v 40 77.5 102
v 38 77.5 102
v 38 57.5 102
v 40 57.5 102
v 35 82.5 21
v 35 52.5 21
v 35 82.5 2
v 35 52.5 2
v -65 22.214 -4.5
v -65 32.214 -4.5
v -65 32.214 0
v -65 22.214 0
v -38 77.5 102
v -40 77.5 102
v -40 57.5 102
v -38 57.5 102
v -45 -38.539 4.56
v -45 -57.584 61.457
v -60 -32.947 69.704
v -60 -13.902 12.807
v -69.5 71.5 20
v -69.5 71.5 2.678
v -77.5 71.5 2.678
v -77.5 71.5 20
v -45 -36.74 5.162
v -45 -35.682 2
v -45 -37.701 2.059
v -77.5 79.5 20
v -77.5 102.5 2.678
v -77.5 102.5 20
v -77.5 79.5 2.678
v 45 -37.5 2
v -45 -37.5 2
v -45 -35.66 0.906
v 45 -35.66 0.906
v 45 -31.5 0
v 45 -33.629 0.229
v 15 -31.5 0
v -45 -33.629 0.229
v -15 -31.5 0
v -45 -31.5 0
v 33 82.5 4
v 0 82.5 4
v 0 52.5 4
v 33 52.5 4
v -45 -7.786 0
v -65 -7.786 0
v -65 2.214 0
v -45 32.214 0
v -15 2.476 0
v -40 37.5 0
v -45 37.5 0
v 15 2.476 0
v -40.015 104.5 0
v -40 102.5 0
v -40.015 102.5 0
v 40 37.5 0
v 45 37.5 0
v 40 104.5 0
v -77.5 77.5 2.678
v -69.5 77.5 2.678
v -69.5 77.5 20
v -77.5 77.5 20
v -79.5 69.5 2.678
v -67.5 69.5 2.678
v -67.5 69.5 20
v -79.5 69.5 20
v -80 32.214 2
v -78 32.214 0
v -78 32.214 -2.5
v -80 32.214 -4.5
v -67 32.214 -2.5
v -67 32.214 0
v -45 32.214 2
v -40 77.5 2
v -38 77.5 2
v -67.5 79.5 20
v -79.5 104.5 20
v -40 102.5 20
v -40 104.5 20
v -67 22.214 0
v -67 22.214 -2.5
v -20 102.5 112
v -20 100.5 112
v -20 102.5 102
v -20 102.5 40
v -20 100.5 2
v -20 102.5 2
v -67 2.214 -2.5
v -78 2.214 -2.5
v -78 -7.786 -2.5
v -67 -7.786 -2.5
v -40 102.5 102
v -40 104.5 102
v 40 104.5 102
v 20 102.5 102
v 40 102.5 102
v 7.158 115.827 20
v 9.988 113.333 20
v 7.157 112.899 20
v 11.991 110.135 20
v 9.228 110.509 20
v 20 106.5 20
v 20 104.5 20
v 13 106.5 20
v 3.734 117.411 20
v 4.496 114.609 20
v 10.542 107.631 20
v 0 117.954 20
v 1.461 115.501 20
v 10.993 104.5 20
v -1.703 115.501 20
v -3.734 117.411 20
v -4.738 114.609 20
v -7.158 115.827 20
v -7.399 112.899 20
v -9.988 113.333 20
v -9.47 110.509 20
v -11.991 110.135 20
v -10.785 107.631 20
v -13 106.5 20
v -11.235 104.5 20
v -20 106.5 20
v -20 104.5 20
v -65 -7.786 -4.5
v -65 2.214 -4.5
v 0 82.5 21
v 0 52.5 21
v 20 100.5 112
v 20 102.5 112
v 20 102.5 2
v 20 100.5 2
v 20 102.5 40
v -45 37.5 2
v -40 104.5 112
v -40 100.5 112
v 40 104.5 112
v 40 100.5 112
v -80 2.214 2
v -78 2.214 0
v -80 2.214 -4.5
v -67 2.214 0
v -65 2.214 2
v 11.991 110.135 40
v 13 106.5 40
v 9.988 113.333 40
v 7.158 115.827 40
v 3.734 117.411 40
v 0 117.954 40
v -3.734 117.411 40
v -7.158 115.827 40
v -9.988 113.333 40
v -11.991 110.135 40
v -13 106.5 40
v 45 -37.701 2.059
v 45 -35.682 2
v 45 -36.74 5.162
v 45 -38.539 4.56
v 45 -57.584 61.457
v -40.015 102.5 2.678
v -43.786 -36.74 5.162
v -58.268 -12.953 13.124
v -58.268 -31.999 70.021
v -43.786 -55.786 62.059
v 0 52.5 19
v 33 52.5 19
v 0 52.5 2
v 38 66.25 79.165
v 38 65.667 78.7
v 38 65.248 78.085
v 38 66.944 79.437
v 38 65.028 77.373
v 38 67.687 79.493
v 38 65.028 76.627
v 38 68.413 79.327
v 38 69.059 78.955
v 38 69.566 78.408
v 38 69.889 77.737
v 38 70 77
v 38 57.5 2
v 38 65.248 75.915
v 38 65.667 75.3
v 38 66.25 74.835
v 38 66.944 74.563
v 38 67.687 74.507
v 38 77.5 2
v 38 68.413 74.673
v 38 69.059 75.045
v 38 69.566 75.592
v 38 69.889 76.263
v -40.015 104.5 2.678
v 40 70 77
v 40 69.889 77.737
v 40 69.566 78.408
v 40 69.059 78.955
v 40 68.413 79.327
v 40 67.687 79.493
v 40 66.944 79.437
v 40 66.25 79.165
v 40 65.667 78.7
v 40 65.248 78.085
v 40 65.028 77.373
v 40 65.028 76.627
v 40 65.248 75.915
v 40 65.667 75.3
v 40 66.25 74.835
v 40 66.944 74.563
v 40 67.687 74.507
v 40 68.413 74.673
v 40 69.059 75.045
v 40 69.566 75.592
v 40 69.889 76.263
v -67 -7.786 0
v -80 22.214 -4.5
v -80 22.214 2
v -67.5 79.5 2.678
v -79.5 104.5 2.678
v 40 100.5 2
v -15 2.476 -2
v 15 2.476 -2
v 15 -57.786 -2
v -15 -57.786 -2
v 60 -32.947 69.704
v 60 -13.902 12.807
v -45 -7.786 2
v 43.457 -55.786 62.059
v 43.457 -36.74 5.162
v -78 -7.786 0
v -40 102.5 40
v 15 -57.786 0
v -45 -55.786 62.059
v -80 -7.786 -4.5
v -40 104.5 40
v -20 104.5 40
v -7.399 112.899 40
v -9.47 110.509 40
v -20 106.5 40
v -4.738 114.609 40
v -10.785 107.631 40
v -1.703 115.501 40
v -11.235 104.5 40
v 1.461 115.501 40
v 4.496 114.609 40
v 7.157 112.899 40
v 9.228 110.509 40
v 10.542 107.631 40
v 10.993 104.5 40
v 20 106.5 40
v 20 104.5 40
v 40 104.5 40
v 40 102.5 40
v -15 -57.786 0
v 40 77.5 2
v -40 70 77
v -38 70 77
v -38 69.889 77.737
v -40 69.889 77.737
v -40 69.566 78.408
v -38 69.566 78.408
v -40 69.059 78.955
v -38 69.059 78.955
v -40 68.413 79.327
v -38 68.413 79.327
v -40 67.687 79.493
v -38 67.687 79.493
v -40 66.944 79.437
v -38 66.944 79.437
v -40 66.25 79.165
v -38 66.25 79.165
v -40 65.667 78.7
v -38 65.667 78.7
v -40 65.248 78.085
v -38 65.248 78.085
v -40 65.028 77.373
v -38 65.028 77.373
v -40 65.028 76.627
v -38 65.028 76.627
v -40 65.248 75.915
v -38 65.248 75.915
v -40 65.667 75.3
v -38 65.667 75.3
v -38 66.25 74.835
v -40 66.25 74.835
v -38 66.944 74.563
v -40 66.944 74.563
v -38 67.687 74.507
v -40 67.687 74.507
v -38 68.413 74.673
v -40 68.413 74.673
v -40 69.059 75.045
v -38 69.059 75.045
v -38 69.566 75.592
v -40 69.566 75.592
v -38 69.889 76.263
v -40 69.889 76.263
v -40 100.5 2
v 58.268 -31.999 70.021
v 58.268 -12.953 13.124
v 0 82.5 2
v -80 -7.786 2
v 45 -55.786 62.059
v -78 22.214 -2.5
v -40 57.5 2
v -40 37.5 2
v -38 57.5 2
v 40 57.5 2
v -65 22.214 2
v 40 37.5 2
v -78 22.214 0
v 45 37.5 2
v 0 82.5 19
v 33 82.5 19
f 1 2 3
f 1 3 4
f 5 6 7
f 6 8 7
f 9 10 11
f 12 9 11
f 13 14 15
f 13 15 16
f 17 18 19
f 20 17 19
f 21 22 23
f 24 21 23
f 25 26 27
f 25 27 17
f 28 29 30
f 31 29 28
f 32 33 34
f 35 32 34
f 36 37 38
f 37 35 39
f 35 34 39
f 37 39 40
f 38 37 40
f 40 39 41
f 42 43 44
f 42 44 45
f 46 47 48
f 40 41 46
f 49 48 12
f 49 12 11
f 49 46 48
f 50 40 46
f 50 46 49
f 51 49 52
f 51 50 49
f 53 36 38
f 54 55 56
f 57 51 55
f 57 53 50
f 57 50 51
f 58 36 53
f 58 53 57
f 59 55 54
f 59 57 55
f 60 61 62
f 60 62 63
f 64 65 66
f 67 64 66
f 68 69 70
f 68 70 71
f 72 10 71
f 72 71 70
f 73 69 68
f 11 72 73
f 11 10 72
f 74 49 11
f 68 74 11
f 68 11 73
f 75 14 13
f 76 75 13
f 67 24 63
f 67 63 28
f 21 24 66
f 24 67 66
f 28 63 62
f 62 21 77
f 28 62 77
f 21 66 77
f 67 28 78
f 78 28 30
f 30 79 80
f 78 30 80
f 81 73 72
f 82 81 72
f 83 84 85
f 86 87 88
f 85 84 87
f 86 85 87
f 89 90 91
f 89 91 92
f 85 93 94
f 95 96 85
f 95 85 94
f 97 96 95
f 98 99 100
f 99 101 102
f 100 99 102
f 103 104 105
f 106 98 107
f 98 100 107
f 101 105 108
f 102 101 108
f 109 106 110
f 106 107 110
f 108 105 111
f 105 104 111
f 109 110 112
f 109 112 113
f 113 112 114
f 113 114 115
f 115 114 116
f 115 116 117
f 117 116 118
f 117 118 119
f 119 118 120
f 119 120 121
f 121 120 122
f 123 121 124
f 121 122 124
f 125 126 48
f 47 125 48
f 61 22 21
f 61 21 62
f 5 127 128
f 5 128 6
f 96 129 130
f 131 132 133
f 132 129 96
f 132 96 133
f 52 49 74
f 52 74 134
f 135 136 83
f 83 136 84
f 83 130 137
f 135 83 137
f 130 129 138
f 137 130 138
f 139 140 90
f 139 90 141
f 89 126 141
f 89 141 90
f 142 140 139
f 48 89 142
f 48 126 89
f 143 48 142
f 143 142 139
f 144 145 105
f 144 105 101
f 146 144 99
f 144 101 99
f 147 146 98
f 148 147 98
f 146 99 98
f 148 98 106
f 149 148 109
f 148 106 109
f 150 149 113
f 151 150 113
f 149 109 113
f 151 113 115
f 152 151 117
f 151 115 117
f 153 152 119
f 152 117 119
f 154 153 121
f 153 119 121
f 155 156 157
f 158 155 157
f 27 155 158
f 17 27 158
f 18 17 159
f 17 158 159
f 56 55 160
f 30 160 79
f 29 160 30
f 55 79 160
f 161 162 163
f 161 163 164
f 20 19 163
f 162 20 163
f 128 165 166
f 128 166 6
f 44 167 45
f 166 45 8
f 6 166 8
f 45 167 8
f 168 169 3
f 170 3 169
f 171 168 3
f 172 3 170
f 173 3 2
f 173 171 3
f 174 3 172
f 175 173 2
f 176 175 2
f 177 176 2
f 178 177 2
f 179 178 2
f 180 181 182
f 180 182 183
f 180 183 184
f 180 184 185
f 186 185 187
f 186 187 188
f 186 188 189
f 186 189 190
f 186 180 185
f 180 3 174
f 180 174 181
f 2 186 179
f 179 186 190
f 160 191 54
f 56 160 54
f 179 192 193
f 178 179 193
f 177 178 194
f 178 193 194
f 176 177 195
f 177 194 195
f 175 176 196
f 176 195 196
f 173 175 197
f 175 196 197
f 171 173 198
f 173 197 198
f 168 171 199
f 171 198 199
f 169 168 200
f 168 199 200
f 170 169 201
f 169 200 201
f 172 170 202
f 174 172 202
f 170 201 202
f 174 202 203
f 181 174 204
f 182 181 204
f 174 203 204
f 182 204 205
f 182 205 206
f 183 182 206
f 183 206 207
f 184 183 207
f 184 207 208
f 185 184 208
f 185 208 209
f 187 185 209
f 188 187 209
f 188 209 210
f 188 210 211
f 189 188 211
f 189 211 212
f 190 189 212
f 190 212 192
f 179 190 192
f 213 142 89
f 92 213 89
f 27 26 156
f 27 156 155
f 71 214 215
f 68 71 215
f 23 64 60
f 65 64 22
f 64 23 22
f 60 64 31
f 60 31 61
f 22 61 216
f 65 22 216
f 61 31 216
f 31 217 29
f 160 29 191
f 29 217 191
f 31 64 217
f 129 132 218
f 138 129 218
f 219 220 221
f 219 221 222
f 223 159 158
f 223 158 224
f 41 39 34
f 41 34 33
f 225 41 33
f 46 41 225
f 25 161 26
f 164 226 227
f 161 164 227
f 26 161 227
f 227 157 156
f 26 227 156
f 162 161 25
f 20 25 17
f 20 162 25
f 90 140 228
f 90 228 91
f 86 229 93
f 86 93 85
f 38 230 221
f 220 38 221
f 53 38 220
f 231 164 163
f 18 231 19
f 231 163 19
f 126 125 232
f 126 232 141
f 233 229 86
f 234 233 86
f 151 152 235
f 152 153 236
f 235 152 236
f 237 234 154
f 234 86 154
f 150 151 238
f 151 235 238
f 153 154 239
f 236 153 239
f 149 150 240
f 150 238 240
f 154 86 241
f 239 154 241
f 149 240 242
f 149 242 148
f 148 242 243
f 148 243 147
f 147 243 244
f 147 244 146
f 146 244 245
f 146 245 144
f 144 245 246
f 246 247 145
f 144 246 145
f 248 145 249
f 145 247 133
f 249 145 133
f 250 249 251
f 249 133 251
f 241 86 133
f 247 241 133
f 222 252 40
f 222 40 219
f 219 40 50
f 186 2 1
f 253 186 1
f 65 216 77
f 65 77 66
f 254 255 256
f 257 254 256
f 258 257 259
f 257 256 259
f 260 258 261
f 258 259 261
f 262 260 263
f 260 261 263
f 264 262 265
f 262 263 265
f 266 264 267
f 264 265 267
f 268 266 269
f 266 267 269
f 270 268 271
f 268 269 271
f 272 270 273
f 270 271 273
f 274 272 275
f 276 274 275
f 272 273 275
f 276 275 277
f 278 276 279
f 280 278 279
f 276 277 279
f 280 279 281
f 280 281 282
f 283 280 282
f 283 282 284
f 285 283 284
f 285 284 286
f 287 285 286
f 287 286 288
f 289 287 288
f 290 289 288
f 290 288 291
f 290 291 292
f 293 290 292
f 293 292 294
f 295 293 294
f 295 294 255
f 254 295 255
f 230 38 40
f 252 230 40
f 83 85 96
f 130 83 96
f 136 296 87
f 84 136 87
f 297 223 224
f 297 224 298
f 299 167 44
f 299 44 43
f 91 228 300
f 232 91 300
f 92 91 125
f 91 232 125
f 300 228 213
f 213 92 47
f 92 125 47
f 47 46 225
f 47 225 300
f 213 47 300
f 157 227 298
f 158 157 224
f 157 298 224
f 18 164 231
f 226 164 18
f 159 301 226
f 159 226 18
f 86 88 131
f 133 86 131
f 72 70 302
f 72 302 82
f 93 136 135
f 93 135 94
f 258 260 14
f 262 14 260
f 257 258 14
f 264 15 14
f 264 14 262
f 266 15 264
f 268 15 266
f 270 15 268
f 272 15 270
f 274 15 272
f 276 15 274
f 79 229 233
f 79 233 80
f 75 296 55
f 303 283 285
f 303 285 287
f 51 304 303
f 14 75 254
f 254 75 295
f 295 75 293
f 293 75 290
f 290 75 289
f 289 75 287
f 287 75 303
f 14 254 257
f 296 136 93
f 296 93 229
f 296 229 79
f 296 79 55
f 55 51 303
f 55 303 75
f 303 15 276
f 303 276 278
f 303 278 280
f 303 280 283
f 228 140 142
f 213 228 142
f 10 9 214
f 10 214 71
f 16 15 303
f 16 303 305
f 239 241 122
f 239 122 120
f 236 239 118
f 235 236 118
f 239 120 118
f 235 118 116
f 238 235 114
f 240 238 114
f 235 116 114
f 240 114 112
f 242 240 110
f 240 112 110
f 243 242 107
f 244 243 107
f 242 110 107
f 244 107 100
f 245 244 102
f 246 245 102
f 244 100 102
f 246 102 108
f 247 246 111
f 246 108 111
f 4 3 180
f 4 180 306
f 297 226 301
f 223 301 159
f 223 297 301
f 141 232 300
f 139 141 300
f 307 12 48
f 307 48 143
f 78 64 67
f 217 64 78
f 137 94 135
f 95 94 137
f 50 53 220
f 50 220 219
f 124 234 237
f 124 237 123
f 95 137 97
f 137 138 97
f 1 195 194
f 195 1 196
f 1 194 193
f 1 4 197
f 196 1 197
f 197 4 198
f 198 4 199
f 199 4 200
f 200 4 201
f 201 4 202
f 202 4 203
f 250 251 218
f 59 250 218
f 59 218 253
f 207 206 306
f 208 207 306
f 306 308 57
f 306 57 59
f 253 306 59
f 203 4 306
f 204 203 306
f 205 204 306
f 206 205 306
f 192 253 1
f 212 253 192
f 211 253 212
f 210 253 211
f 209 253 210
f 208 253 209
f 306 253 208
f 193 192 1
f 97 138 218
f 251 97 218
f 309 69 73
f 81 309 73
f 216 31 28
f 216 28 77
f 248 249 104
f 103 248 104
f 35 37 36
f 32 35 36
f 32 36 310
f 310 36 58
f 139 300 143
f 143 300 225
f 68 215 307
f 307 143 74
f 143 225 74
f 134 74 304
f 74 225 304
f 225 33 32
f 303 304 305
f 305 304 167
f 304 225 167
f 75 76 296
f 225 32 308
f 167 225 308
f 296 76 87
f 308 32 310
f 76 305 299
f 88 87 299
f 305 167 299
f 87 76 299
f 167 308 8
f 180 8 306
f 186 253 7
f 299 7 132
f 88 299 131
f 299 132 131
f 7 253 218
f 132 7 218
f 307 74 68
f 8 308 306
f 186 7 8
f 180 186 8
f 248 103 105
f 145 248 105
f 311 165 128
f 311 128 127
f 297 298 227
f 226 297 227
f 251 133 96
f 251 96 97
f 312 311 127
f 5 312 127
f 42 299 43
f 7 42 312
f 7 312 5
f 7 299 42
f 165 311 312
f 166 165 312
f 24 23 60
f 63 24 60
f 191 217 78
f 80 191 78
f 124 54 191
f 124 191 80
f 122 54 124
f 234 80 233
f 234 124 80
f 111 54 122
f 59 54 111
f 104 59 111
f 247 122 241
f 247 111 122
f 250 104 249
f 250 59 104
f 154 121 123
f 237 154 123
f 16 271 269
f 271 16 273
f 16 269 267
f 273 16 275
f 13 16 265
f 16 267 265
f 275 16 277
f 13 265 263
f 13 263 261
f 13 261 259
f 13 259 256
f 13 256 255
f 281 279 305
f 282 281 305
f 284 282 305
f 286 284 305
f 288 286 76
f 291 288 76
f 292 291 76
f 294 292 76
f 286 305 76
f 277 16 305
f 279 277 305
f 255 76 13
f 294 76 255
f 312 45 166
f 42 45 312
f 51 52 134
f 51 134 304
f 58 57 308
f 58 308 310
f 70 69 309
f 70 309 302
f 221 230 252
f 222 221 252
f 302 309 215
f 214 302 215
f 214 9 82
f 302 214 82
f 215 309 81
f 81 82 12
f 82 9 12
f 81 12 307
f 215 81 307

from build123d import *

# Parameters (mm, degrees)
SKETCH3_W            = 80
SKETCH3_H            = 65
SKETCH3_W_2          = 90
SKETCH3_H_2          = 75
BOSS_EXTRUDE1_DEPTH  = 2
SKETCH6_W            = 2
SKETCH6_H            = 20
BOSS_EXTRUDE2_DEPTH  = 100
SKETCH7_R            = 2.5
CUT_EXTRUDE2_DEPTH   = 168.735655124
SKETCH9_W            = 20
SKETCH9_H            = 2
BOSS_EXTRUDE3_DEPTH  = 110
BOSS_EXTRUDE4_DEPTH  = 90
FILLET1_R            = 10
SKETCH12_W           = 30
SKETCH12_H           = 60.261991402
BOSS_EXTRUDE5_DEPTH  = 2
CUT_EXTRUDE3_DEPTH   = 113
BOSS_EXTRUDE10_DEPTH = 60
SKETCH18_W           = 35
SKETCH18_H           = 30
BOSS_EXTRUDE11_DEPTH = 2
SKETCH19_W           = 2
SKETCH19_H           = 30
BOSS_EXTRUDE12_DEPTH = 15
SKETCH20_W           = 35
SKETCH20_H           = 30
BOSS_EXTRUDE13_DEPTH = 2
SKETCH21_W           = 80
SKETCH21_H           = 10
SKETCH21_H_2         = 40
BOSS_EXTRUDE14_DEPTH = 2
SKETCH22_W           = 20
SKETCH22_H           = 20
BOSS_EXTRUDE15_DEPTH = 20
CUT_EXTRUDE4_DEPTH   = 20
SKETCH24_W           = 2
SKETCH24_H           = 40
BOSS_EXTRUDE16_DEPTH = 20
SKETCH25_W           = 6.5
SKETCH25_H           = 10
BOSS_EXTRUDE17_DEPTH = 15
SKETCH27_W           = 11
SKETCH27_H           = 2.5
CUT_EXTRUDE5_DEPTH   = 165.450600485
SKETCH29_W           = 20
SKETCH29_H           = 35
BOSS_EXTRUDE18_DEPTH = 45
SKETCH32_W           = 5.5
SKETCH32_H           = 35
SKETCH32_W_2         = 8
SKETCH32_H_2         = 6
CUT_EXTRUDE10_DEPTH  = 45
SKETCH33_W           = 39.484783522
SKETCH33_H           = 2.678161959
CUT_EXTRUDE12_DEPTH  = 37


with BuildPart() as part:
    # Sketch3 → Boss-Extrude1 (new body)
    with BuildSketch(Plane.XY):
        with Locations((0, 70)):
            Rectangle(SKETCH3_W, SKETCH3_H)
        Rectangle(SKETCH3_W_2, SKETCH3_H_2)
    extrude(amount=BOSS_EXTRUDE1_DEPTH)

    # Sketch6 → Boss-Extrude2 (add)
    with BuildSketch(Plane.XY.offset(2)):
        with Locations((-39, 67.5)):
            Rectangle(SKETCH6_W, SKETCH6_H)
        with Locations((39, 67.5)):
            Rectangle(SKETCH6_W, SKETCH6_H)
    extrude(amount=BOSS_EXTRUDE2_DEPTH)

    # Sketch7 → Cut-Extrude2 (cut, through all)
    with BuildSketch(Plane(origin=(40, 0, 0), x_dir=(0, 0, -1), z_dir=(1, 0, 0))):
        with Locations(Location((-77, 67.5, 0), (0, 0, 90))):
            Circle(SKETCH7_R)
    extrude(amount=-CUT_EXTRUDE2_DEPTH, mode=Mode.SUBTRACT)

    # Sketch9 → Boss-Extrude3 (add)
    with BuildSketch(Plane.XY.offset(2)):
        with Locations((-30, 101.5)):
            Rectangle(SKETCH9_W, SKETCH9_H)
        with Locations((30, 101.5)):
            Rectangle(SKETCH9_W, SKETCH9_H)
    extrude(amount=BOSS_EXTRUDE3_DEPTH)

    # Fillet1
    # the kernel refuses this fillet: 10 mm, written as the material it takes off along each edge
    with BuildSketch(Plane(origin=(-60, -37.5, 0), x_dir=(0, 0, 1), z_dir=(1, 0, 0))) as fillet1_piece_1:
        with BuildLine():
            CenterArc((10, -6), FILLET1_R, 143.130102354, 36.869897646)
            Line((0, -6), (-0.2, -6))
            Line((-0.2, -6), (-0.2, 0))
            Line((-0.2, 0), (0, 0.2))
            ThreePointArc((0, 0.2), (1, 0.2), (1.84, 0.12))
            Line((1.84, 0.12), (2, 0))
        make_face()
    extrude(amount=120, mode=Mode.SUBTRACT)

    # Sketch12 → Boss-Extrude5 (add)
    with BuildSketch(Plane(origin=(0, 0, 0), x_dir=(-1, 0, 0), z_dir=(0, 0, -1))):
        with Locations((0, -27.654978505)):
            Rectangle(SKETCH12_W, SKETCH12_H)
    extrude(amount=BOSS_EXTRUDE5_DEPTH)

    # Sketch18 → Boss-Extrude11 (add)
    with BuildSketch(Plane.XY.offset(2)):
        with Locations((17.5, 67.5)):
            Rectangle(SKETCH18_W, SKETCH18_H)
    extrude(amount=BOSS_EXTRUDE11_DEPTH)

    # Sketch19 → Boss-Extrude12 (add)
    with BuildSketch(Plane.XY.offset(4)):
        with Locations((34, 67.5)):
            Rectangle(SKETCH19_W, SKETCH19_H)
    extrude(amount=BOSS_EXTRUDE12_DEPTH)

    # Sketch20 → Boss-Extrude13 (add)
    with BuildSketch(Plane.XY.offset(19)):
        with Locations((17.5, 67.5)):
            Rectangle(SKETCH20_W, SKETCH20_H)
    extrude(amount=BOSS_EXTRUDE13_DEPTH)

    # Sketch21 → Boss-Extrude14 (add)
    with BuildSketch(Plane(origin=(0, 102.5, 0), x_dir=(1, 0, 0), z_dir=(0, 1, 0))):
        with Locations((0, -107)):
            Rectangle(SKETCH21_W, SKETCH21_H)
        with Locations((0, -20)):
            Rectangle(SKETCH21_W, SKETCH21_H_2)
    extrude(amount=BOSS_EXTRUDE14_DEPTH)

    # Sketch22 → Boss-Extrude15 (add)
    with BuildSketch(Plane(origin=(0, 104.5, 0), x_dir=(1, 0, 0), z_dir=(0, 1, 0))):
        with Locations((-10, -30)):
            Rectangle(SKETCH22_W, SKETCH22_H)
        with Locations((10, -30)):
            Rectangle(SKETCH22_W, SKETCH22_H)
    extrude(amount=BOSS_EXTRUDE15_DEPTH)

    # Sketch23 → Cut-Extrude4 (cut)
    with BuildSketch(Plane(origin=(0, 0, 20), x_dir=(-1, 0, 0), z_dir=(0, 0, -1))):
        with BuildLine():
            Line((-20, 124.5), (-20, 106.5))
            Line((-20, 106.5), (-13, 106.5))
            ThreePointArc((-13, 106.5), (0, 117.954368483), (13, 106.5))
            Line((13, 106.5), (20, 106.5))
            Line((20, 106.5), (20, 124.5))
            Line((20, 124.5), (-20, 124.5))
        make_face()
        with BuildLine():
            ThreePointArc((11.234714386, 104.5), (0.121034595, 115.61367979), (-10.992645195, 104.5))
            Line((-10.992645195, 104.5), (11.234714386, 104.5))
        make_face()
    extrude(amount=-CUT_EXTRUDE4_DEPTH, mode=Mode.SUBTRACT)

    # Sketch24 → Boss-Extrude16 (add)
    with BuildSketch(Plane.ZY.offset(45)):
        with Locations((1, 12.214025794)):
            Rectangle(SKETCH24_W, SKETCH24_H)
    extrude(amount=BOSS_EXTRUDE16_DEPTH)

    # Sketch25 → Boss-Extrude17 (add)
    with BuildSketch(Plane.ZY.offset(65)):
        with Locations((-1.25, 27.214025794)):
            Rectangle(SKETCH25_W, SKETCH25_H)
        with Locations((-1.25, -2.785974206)):
            Rectangle(SKETCH25_W, SKETCH25_H)
    extrude(amount=BOSS_EXTRUDE17_DEPTH)

    # Sketch27 → Cut-Extrude5 (cut, through all)
    with BuildSketch(Plane(origin=(0, 32.214025794, 0), x_dir=(1, 0, 0), z_dir=(0, 1, 0))):
        with Locations((-72.5, 1.25)):
            Rectangle(SKETCH27_W, SKETCH27_H)
    extrude(amount=-CUT_EXTRUDE5_DEPTH, mode=Mode.SUBTRACT)

    # Sketch29 → Boss-Extrude18 (add)
    with BuildSketch(Plane.ZY.offset(40)):
        with Locations((10, 87)):
            Rectangle(SKETCH29_W, SKETCH29_H)
    extrude(amount=BOSS_EXTRUDE18_DEPTH)

    # Sketch32 → Cut-Extrude10 (cut)
    with BuildSketch(Plane(origin=(0, 0, 0), x_dir=(-1, 0, 0), z_dir=(0, 0, -1))):
        Polygon((40, 102.5), (77.5, 102.5), (77.5, 79.5), (67.5, 79.5), (67.5, 69.5), (40, 69.5), align=None)
        with Locations((82.25, 87)):
            Rectangle(SKETCH32_W, SKETCH32_H)
        with Locations((73.5, 74.5)):
            Rectangle(SKETCH32_W_2, SKETCH32_H_2)
    extrude(amount=-CUT_EXTRUDE10_DEPTH, mode=Mode.SUBTRACT)

    # Sketch33 → Cut-Extrude12 (cut)
    with BuildSketch(Plane(origin=(0, 104.5, 0), x_dir=(1, 0, 0), z_dir=(0, 1, 0))):
        with Locations((-59.757608239, -1.33908098)):
            Rectangle(SKETCH33_W, SKETCH33_H)
    extrude(amount=-CUT_EXTRUDE12_DEPTH, mode=Mode.SUBTRACT)


with BuildPart() as body_2:
    # Sketch10 → Boss-Extrude4 (new body)
    with BuildSketch(Plane(origin=(45, 0, 0), x_dir=(0, 0, -1), z_dir=(1, 0, 0))):
        Polygon((-2.058926134, -37.701447462), (-62.058926134, -57.785974206), (-62.058926134, -55.785974206), (-2, -35.681722403), align=None)
    extrude(amount=-BOSS_EXTRUDE4_DEPTH)

    # Sketch14 → Cut-Extrude3 (cut)
    with BuildSketch(Plane(origin=(45, 0, 0), x_dir=(0, 0, -1), z_dir=(1, 0, 0))):
        Polygon((-62.058926134, -55.785974206), (-58.636316443, -66.010590601), (-73.036947703, -70.831088329), align=None)
    extrude(amount=-CUT_EXTRUDE3_DEPTH, mode=Mode.SUBTRACT)

    # Sketch15 → Boss-Extrude10 (add)
    with BuildSketch(Plane(origin=(0, -24.301628774, 72.598062431), x_dir=(1, 0, 0), z_dir=(0, -0.3174298395941448, 0.9482817603092635))):
        Polygon((-45, -35.098030373), (-60, -9.117268259), (-58.267949192, -8.117268259), (-42.690598923, -35.098030373), align=None)
        Polygon((45, -35.098030373), (60, -9.117268259), (58.267949192, -8.117268259), (42.337684751, -35.098030373), align=None)
    extrude(amount=-BOSS_EXTRUDE10_DEPTH)


solid = Compound([part.part, body_2.part])
